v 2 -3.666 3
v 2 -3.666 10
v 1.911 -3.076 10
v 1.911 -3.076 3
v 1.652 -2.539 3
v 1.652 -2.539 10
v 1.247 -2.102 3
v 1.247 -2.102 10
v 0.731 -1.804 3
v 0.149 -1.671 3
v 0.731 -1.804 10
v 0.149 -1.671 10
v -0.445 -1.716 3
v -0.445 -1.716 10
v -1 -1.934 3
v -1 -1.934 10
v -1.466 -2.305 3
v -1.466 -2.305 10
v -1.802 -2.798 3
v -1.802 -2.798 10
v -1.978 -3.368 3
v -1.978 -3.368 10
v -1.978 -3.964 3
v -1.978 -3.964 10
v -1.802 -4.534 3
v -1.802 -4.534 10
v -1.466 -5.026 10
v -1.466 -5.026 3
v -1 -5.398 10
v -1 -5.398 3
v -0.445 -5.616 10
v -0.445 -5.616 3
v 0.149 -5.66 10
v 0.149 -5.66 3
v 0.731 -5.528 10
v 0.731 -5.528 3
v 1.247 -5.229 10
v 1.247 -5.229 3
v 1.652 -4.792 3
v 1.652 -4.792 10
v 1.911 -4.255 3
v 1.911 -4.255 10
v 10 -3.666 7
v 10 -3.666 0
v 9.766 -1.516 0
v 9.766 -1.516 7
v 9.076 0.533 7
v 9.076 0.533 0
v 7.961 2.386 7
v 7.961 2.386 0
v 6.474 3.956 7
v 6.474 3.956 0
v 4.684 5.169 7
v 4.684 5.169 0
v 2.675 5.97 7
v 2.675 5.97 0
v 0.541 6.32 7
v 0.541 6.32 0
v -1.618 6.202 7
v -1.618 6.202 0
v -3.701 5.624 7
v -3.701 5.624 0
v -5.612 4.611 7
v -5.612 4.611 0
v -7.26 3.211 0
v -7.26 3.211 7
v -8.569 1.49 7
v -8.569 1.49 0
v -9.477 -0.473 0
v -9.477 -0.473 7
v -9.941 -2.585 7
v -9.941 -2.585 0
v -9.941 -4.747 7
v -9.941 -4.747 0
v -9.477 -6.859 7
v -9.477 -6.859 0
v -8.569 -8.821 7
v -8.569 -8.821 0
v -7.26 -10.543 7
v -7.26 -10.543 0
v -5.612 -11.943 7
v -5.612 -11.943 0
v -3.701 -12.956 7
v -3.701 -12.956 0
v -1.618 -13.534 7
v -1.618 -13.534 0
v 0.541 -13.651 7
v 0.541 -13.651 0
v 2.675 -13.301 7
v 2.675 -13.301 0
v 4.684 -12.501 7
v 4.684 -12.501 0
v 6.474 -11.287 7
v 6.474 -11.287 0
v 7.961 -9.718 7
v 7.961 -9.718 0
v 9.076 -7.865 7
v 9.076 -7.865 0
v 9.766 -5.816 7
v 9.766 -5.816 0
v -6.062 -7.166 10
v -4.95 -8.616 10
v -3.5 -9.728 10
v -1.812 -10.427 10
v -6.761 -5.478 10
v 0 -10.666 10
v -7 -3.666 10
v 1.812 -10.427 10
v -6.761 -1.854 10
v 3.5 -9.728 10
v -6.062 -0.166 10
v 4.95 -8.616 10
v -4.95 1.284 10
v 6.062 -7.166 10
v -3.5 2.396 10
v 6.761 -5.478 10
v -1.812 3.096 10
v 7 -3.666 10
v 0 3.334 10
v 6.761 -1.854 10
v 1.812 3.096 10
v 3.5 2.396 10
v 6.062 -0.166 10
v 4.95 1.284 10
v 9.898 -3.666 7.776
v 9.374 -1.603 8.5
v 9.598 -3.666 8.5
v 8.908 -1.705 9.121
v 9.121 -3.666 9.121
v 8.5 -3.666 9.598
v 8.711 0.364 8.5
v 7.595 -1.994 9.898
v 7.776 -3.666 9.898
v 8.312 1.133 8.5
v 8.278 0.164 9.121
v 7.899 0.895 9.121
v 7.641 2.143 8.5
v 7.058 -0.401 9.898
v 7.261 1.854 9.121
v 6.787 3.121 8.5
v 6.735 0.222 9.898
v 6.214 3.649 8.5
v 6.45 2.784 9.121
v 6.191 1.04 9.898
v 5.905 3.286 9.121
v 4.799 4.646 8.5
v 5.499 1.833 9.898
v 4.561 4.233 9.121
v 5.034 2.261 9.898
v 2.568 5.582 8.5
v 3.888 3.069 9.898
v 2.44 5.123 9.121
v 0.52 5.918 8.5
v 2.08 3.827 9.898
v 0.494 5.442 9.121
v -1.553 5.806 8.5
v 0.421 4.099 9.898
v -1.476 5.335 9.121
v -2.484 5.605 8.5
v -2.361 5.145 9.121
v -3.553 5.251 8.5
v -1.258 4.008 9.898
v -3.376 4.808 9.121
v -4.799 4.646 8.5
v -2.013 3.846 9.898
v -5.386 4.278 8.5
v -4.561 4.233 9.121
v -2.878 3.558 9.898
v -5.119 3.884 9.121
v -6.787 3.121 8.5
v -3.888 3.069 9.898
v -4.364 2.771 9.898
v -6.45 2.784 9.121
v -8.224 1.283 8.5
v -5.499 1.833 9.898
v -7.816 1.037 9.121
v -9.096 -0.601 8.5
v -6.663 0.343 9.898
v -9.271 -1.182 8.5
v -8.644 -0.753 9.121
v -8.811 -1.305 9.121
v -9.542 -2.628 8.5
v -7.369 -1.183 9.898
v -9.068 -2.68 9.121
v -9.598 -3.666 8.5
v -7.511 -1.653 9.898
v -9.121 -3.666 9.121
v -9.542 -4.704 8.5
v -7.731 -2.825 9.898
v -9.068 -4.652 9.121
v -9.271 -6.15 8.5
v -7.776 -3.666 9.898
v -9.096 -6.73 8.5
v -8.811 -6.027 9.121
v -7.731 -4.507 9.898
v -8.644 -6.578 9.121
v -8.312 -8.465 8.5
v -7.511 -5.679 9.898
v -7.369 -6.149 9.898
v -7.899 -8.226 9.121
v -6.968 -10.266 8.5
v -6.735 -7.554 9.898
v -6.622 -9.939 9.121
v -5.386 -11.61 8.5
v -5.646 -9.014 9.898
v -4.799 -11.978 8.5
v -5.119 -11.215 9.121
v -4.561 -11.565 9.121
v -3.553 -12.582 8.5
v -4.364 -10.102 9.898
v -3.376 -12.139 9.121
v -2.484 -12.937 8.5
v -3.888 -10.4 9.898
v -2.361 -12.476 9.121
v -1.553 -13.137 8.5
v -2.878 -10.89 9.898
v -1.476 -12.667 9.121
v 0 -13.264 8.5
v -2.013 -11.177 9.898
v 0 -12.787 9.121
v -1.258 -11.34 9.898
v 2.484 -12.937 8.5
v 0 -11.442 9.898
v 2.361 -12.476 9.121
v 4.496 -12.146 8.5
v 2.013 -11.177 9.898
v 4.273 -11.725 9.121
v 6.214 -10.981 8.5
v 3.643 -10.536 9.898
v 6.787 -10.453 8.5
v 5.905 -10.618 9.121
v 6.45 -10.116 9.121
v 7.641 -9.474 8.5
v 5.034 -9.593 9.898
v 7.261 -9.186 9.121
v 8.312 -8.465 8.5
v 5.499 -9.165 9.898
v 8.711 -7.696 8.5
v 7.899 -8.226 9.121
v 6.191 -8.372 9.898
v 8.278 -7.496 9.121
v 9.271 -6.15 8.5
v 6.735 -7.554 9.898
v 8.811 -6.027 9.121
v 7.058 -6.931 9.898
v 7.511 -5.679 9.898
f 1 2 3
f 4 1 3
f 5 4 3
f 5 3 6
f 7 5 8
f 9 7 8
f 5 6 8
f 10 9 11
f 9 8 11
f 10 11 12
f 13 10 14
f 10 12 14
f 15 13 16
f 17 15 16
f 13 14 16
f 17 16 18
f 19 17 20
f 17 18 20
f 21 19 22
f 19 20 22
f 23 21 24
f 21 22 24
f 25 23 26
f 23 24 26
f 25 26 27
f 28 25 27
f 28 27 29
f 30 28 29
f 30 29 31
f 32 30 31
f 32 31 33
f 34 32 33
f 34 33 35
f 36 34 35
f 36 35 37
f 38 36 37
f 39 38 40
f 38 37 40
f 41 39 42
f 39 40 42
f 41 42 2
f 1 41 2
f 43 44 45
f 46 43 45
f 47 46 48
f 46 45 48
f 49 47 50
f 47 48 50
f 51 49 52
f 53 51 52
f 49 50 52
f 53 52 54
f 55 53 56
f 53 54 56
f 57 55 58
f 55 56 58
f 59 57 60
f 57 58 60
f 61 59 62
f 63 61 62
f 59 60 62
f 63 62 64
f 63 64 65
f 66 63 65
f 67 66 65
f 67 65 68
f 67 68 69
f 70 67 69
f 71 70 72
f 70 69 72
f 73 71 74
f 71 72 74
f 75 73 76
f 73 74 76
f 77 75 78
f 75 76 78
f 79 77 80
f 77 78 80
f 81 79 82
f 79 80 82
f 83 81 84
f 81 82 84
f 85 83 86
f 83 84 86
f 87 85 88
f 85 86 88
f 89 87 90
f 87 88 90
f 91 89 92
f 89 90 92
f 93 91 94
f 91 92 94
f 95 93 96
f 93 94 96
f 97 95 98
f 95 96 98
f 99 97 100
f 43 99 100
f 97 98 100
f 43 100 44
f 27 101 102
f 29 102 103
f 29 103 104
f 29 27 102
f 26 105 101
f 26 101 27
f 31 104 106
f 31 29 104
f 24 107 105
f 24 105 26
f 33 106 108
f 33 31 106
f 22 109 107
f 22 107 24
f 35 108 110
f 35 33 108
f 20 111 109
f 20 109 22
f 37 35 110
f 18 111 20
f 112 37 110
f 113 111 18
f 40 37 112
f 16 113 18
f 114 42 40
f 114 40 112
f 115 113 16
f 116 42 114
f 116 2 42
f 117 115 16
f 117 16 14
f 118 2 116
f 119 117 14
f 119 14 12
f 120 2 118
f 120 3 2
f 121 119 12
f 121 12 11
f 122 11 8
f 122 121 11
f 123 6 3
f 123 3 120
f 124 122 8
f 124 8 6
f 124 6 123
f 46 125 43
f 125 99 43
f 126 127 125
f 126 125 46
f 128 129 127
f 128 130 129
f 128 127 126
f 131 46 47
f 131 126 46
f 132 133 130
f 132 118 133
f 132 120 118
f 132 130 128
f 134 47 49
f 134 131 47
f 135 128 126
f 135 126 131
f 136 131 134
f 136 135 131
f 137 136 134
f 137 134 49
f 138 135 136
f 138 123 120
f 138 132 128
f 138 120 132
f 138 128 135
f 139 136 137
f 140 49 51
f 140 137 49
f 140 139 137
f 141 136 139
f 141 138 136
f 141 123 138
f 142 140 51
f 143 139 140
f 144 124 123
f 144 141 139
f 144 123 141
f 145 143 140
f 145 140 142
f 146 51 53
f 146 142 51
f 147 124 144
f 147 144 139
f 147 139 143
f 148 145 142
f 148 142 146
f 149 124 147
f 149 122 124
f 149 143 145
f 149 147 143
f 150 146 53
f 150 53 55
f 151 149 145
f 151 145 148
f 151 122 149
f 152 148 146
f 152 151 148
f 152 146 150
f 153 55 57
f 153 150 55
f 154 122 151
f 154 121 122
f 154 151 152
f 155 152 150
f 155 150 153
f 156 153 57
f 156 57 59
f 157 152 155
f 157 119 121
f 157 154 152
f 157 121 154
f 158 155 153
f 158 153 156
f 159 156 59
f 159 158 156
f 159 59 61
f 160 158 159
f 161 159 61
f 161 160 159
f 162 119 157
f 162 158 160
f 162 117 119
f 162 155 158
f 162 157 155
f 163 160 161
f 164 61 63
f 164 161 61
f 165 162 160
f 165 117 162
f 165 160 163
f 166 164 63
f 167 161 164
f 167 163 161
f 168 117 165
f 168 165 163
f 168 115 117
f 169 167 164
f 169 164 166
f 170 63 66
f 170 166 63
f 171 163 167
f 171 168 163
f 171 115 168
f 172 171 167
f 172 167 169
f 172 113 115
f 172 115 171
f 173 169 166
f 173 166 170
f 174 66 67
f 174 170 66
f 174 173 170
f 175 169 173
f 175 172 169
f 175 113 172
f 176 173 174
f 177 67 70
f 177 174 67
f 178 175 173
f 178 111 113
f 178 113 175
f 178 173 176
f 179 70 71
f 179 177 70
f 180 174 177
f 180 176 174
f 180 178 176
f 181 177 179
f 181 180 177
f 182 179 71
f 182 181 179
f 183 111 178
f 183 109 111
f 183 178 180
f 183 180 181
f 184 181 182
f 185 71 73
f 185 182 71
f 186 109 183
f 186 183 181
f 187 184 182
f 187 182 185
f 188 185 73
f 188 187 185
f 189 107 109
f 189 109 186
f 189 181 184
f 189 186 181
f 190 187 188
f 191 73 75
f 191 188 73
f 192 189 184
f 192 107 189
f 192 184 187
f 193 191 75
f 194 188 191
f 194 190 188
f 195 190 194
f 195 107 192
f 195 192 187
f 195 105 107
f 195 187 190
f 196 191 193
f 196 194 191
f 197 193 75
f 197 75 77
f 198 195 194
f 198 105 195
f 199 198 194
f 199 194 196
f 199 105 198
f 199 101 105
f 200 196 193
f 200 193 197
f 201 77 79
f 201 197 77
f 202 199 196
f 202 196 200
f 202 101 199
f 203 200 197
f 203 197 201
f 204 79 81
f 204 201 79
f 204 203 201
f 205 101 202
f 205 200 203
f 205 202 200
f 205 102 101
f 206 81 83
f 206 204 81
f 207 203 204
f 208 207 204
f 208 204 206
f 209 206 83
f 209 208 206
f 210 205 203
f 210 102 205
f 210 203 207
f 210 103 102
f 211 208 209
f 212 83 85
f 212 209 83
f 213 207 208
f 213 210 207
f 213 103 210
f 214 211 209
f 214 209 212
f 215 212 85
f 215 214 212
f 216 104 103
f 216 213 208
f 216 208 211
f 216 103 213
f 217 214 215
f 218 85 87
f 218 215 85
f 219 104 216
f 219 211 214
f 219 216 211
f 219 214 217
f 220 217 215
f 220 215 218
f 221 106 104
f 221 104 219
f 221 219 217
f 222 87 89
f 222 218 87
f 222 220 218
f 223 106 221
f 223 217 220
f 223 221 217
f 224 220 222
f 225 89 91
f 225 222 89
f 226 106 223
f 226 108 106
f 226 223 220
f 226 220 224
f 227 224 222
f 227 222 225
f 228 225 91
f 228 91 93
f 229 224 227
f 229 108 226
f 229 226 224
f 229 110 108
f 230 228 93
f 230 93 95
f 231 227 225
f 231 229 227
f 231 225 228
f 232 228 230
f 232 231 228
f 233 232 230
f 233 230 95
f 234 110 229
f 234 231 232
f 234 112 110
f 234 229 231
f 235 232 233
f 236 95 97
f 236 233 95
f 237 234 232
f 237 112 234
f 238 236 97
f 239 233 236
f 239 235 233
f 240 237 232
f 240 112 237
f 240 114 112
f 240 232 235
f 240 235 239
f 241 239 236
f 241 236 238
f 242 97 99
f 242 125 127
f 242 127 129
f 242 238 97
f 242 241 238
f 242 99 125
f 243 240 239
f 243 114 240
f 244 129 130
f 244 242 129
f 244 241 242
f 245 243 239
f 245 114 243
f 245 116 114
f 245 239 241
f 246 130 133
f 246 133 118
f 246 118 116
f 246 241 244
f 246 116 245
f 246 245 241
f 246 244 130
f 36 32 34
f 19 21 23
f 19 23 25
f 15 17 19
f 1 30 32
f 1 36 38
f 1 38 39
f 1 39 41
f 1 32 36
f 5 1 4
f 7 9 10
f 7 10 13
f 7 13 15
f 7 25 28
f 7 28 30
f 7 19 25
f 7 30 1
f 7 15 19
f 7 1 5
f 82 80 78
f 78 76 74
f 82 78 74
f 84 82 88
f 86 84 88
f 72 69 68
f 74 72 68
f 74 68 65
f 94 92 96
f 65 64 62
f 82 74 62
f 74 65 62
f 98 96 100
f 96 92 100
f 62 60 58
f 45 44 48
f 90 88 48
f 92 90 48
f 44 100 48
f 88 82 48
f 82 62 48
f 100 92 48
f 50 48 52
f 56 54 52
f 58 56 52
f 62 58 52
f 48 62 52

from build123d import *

# Parameters (mm, degrees)
SKETCH1_R           = 10
BOSS_EXTRUDE1_DEPTH = 10
FILLET1_R           = 3
SKETCH2_R           = 2
CUT_EXTRUDE1_DEPTH  = 7


with BuildPart() as part:
    # Sketch1 → Boss-Extrude1 (new body)
    with BuildSketch(Plane.XY):
        with Locations((0, -3.665819089)):
            Circle(SKETCH1_R)
    extrude(amount=BOSS_EXTRUDE1_DEPTH)

    # Fillet1
    fillet1_edges = [part.edges().sort_by_distance(p)[0] for p in [
        (-10, -3.665819089, 10),
    ]]
    fillet(fillet1_edges, radius=FILLET1_R)

    # Sketch2 → Cut-Extrude1 (cut)
    with BuildSketch(Plane.XY.offset(10)):
        with Locations((0, -3.665819089)):
            Circle(SKETCH2_R)
    extrude(amount=-CUT_EXTRUDE1_DEPTH, mode=Mode.SUBTRACT)


solid = part.part
